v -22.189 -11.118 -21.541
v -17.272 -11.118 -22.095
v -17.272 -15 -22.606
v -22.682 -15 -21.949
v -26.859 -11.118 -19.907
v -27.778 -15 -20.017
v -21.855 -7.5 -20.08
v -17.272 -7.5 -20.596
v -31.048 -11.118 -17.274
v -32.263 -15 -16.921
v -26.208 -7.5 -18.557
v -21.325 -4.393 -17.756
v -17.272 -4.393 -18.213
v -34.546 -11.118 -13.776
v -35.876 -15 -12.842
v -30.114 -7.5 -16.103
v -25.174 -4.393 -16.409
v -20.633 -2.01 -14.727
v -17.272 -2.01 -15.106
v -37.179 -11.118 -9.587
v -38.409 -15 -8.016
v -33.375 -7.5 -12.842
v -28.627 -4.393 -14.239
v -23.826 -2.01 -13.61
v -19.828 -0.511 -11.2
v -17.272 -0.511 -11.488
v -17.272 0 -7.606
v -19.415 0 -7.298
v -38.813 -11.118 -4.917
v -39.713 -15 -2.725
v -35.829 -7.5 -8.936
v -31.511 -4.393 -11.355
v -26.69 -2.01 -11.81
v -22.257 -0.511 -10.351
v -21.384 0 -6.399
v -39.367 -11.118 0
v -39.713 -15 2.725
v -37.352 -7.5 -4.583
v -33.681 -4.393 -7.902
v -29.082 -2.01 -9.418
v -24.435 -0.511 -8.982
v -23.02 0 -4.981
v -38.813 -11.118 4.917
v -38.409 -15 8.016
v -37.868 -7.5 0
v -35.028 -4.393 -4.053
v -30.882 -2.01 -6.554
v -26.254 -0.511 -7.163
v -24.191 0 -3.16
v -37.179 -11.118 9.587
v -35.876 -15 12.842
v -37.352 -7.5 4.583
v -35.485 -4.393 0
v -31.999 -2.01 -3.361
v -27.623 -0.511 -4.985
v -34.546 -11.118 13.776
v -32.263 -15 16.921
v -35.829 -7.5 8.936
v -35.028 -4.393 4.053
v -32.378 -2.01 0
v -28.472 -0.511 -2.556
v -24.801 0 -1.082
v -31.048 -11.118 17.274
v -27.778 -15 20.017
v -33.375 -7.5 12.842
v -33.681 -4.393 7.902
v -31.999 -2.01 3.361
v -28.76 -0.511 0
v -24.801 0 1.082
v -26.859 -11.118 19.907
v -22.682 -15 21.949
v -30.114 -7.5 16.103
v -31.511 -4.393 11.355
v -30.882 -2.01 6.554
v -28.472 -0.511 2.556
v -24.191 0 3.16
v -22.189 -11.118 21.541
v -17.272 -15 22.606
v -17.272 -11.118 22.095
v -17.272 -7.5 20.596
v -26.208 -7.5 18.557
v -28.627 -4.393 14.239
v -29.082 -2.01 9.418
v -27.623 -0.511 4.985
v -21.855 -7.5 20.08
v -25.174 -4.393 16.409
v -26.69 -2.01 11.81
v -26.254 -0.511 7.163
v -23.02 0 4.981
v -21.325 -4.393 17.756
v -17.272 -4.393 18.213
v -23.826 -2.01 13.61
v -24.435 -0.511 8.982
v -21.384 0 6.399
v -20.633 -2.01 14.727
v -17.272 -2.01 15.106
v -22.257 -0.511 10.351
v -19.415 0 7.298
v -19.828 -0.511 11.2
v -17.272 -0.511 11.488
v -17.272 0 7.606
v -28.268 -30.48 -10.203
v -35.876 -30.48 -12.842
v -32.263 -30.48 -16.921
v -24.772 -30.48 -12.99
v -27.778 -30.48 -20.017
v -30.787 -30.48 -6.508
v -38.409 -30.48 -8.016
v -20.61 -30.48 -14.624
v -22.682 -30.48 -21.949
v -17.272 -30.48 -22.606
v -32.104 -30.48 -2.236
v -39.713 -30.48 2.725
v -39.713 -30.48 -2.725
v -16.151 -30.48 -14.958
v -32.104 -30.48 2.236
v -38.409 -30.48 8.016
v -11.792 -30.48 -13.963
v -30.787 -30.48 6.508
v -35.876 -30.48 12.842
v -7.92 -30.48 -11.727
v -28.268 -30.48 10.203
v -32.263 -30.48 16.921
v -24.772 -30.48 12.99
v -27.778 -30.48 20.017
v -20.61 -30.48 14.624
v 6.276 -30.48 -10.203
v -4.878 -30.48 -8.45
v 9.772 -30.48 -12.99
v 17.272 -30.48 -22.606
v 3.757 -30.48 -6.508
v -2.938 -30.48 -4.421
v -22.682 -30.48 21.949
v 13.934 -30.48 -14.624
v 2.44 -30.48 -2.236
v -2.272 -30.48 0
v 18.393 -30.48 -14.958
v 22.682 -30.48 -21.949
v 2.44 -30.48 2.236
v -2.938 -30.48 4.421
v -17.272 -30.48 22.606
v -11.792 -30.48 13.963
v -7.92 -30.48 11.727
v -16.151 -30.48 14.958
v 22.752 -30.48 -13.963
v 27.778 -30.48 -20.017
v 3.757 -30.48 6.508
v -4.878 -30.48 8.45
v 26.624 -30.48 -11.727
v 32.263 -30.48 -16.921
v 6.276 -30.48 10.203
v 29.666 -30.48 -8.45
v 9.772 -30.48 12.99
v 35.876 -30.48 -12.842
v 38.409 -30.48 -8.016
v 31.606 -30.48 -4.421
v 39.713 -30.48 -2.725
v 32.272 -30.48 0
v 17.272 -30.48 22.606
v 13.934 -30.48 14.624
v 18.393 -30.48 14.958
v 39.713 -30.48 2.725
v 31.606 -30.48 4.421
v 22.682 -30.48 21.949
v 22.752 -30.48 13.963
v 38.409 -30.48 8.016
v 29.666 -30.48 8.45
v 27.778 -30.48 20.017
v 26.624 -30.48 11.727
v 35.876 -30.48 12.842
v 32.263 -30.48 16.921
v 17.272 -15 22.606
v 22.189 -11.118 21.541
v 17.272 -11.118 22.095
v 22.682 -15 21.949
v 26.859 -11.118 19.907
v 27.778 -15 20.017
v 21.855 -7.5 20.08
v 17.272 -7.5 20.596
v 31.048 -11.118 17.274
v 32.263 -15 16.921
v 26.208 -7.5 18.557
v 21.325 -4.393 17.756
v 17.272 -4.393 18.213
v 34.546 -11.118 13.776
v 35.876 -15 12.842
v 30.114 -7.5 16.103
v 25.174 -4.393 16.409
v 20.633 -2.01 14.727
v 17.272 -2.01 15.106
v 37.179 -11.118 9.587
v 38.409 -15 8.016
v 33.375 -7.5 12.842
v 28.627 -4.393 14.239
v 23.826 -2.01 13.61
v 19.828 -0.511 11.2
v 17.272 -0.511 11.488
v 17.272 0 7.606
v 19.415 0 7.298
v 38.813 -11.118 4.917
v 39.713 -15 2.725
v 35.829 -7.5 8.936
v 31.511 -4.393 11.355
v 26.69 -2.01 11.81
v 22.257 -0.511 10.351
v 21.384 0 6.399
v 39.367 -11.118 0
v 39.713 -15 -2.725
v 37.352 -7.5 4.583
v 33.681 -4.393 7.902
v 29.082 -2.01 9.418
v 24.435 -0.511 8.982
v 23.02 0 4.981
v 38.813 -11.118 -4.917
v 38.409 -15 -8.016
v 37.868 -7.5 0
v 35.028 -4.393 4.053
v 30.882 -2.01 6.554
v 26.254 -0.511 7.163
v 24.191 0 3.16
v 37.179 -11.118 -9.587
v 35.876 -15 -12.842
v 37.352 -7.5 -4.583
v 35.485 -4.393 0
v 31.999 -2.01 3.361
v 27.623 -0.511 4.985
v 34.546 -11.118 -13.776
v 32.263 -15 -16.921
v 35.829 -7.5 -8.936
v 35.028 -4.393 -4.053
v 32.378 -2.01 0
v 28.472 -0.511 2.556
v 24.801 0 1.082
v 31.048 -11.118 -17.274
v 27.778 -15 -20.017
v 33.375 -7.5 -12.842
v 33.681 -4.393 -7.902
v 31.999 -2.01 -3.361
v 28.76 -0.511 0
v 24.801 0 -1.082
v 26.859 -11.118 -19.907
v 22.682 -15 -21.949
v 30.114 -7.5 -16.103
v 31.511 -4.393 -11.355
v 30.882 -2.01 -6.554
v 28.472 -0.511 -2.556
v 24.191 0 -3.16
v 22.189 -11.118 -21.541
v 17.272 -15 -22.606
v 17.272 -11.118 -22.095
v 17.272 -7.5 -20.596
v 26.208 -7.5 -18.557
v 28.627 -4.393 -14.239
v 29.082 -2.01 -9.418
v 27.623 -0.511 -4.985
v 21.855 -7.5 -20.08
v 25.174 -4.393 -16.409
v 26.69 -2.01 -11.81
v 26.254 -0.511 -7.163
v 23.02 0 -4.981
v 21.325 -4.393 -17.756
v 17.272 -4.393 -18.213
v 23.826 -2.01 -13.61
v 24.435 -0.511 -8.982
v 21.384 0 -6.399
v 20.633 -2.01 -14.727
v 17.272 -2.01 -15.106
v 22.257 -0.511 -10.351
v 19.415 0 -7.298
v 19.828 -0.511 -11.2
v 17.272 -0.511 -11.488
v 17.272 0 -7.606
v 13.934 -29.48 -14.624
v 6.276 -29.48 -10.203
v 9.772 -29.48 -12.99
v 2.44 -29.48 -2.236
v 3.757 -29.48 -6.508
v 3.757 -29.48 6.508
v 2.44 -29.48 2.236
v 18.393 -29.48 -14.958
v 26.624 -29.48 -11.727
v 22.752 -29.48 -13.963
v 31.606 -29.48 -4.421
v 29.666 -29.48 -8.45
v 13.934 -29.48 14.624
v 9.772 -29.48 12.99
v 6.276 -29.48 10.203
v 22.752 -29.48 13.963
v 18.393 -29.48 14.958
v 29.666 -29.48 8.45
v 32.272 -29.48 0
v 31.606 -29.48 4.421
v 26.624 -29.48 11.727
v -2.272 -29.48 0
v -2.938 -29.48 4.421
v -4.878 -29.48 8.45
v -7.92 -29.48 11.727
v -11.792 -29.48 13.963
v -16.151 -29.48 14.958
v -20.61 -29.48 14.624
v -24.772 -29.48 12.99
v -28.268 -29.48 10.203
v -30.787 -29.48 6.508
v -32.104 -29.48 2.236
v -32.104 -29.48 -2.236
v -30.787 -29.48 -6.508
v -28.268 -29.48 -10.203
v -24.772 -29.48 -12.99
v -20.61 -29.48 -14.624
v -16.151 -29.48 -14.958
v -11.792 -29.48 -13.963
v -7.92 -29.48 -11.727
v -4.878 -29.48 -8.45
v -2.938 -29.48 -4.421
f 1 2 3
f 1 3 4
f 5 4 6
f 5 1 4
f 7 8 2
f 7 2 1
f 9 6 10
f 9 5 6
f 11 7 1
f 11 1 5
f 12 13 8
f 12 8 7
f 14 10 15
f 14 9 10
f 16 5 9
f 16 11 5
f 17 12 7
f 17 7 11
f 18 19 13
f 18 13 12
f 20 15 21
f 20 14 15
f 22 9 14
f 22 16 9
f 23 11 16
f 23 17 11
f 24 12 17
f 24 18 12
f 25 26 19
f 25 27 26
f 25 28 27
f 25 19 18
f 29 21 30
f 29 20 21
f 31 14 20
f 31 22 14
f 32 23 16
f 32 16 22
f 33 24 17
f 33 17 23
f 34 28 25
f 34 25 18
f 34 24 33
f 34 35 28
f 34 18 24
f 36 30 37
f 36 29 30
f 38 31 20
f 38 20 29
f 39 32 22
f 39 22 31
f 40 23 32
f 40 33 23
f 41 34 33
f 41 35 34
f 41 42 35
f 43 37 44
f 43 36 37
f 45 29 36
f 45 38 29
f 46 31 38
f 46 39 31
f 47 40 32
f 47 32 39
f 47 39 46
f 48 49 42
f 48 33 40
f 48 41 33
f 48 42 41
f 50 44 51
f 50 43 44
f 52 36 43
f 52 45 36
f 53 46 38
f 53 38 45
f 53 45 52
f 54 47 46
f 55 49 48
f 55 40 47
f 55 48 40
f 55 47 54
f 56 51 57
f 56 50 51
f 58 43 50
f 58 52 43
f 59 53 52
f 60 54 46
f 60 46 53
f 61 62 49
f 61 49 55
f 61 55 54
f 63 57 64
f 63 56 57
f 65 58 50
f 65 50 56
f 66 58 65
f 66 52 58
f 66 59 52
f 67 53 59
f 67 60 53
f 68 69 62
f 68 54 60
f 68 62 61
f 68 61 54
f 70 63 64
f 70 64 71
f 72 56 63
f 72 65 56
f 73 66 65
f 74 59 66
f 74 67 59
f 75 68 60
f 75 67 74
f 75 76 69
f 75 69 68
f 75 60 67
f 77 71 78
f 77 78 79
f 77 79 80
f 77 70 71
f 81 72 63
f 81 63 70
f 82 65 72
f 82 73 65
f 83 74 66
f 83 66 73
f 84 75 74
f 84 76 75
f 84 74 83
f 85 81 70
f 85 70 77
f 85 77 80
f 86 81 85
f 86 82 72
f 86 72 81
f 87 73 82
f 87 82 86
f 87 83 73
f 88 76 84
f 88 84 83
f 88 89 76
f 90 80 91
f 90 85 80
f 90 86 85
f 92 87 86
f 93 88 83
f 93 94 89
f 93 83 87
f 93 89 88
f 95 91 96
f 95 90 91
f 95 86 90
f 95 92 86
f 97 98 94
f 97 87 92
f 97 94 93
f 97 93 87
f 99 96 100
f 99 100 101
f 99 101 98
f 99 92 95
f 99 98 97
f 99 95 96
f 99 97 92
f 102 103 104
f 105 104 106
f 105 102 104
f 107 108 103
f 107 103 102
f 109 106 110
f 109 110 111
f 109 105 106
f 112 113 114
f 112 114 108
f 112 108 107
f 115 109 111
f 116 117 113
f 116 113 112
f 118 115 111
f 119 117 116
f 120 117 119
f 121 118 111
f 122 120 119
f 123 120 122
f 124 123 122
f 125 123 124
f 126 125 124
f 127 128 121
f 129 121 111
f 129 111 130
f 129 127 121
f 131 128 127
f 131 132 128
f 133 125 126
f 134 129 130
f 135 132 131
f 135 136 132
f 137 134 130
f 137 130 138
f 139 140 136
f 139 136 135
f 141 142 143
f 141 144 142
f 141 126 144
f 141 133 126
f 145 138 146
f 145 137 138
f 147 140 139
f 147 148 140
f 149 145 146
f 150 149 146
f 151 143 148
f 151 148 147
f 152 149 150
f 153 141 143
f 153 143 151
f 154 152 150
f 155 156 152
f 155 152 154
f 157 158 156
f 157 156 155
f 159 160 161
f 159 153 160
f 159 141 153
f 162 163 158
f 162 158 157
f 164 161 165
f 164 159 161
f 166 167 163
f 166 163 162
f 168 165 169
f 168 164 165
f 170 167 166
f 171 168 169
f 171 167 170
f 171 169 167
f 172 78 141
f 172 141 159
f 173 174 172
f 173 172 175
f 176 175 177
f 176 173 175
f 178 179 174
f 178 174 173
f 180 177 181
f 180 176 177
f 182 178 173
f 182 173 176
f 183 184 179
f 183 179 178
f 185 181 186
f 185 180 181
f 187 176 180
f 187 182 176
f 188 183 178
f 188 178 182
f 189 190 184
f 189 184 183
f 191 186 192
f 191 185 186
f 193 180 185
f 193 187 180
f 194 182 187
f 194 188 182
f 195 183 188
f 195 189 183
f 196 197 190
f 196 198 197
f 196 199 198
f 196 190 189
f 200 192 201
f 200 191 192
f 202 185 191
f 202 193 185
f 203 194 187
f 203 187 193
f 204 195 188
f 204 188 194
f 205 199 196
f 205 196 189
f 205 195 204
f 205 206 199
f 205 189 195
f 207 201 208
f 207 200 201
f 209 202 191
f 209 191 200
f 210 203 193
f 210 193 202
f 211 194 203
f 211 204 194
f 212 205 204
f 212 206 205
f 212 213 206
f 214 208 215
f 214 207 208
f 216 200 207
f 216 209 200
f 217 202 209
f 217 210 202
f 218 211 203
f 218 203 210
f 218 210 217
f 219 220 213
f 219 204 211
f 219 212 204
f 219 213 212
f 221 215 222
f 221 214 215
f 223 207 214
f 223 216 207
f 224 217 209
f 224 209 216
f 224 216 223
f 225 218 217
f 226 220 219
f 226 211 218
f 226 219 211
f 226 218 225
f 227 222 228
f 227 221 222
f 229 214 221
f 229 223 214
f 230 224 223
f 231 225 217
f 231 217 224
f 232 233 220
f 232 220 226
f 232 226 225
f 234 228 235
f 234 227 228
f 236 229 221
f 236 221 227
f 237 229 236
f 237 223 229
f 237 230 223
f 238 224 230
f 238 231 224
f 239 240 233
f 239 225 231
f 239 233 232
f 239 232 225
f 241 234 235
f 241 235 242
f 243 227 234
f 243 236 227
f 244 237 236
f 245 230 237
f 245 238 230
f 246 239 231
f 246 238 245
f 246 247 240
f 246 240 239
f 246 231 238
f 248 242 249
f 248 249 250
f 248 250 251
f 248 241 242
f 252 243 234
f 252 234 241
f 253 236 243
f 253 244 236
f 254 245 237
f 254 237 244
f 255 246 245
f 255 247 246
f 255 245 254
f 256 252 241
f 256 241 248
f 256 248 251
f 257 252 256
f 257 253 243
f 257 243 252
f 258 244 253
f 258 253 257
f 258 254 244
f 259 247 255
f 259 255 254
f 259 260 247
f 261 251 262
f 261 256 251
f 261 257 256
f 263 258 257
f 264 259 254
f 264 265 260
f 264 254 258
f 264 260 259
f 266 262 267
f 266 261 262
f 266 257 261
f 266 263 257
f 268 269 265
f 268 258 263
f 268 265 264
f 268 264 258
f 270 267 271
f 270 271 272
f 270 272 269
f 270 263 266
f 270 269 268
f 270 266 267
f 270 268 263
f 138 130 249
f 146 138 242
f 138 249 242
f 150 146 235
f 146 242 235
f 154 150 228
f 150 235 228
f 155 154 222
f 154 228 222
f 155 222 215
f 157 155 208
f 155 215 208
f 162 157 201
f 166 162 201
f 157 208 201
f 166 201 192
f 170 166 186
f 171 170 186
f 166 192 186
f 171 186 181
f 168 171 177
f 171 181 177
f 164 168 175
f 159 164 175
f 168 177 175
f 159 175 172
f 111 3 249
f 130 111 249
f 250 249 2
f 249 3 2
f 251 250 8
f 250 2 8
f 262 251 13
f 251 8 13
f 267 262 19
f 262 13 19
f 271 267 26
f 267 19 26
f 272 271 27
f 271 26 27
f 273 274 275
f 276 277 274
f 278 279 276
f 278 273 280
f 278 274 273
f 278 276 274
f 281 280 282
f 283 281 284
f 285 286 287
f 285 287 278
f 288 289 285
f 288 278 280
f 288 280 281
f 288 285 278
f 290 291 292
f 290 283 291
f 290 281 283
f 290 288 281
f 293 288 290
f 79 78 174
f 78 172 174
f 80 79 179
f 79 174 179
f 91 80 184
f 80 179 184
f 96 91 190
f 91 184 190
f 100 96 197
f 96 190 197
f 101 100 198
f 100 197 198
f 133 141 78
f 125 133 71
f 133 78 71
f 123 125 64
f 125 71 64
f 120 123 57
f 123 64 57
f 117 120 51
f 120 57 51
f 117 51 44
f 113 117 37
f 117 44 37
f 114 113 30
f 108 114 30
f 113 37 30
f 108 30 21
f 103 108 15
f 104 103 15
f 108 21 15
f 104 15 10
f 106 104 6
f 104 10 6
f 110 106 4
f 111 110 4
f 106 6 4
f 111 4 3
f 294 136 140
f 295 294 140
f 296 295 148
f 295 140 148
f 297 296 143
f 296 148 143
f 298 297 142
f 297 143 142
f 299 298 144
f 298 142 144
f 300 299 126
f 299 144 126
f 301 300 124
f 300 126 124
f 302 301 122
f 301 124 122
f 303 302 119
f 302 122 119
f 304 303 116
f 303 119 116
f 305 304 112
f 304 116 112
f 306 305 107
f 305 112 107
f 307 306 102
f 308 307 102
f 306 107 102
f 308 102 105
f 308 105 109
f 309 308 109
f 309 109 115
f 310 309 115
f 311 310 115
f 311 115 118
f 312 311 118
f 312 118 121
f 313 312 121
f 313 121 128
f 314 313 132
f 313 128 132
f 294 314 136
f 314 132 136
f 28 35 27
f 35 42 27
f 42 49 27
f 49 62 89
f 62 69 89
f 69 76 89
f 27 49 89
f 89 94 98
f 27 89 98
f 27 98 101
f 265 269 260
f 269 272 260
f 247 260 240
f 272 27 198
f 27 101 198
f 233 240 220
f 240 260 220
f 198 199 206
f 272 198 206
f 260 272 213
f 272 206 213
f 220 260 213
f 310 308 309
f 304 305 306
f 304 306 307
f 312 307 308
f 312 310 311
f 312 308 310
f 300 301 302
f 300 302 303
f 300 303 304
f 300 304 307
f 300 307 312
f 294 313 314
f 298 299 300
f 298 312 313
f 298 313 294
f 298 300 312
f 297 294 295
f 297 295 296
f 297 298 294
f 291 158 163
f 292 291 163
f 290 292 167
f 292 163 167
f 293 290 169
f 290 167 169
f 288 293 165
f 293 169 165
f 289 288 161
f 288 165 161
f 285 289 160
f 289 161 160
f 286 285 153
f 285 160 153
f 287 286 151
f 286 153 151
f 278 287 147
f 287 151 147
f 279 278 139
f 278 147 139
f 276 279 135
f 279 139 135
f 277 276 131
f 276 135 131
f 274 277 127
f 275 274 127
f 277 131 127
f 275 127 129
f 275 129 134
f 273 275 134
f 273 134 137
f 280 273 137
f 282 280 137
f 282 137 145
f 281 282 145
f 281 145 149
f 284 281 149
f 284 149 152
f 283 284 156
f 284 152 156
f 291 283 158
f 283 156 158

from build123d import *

# Parameters (mm, degrees)
PAD_DEPTH    = 30.48
FILLET_R     = 15
SKETCH001_R  = 15
POCKET_DEPTH = 1


with BuildPart() as part:
    # Sketch → Pad (new body)
    with BuildSketch(Plane.XZ):
        with BuildLine():
            ThreePointArc((-17.272, 22.606), (-39.878, 0), (-17.272, -22.606))
            Line((-17.272, -22.606), (17.272, -22.606))
            ThreePointArc((17.272, -22.606), (39.878, 0), (17.272, 22.606))
            Line((-17.272, 22.606), (17.272, 22.606))
        make_face()
    extrude(amount=PAD_DEPTH)

    # Fillet
    fillet_edges = [part.edges().sort_by_distance(p)[0] for p in [
        (0, 0, 22.606),
    ]]
    fillet(fillet_edges, radius=FILLET_R)

    # Sketch001 (on Face4 of Fillet) → Pocket (cut)
    with BuildSketch(Plane.XZ.offset(30.48)):
        with Locations((-17.272, 0)):
            Circle(SKETCH001_R)
        with Locations((17.272, 0)):
            Circle(SKETCH001_R)
    extrude(amount=-POCKET_DEPTH, mode=Mode.SUBTRACT)


solid = part.part
